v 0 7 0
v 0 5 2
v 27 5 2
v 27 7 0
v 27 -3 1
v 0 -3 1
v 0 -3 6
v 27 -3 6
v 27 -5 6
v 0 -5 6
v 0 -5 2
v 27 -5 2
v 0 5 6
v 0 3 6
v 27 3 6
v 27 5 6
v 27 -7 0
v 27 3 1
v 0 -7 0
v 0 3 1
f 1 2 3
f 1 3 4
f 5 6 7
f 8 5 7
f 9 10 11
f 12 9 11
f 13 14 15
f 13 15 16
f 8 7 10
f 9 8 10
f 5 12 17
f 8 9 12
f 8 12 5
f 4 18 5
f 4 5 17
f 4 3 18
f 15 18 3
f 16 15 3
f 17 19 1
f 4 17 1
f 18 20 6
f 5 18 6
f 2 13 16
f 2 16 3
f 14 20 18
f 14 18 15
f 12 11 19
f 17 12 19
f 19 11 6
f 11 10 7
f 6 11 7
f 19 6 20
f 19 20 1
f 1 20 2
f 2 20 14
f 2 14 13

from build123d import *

# Parameters (mm, degrees)
PAD_DEPTH = 27


with BuildPart() as part:
    # Sketch → Pad (new body)
    with BuildSketch(Plane.YZ):
        Polygon((0, 0), (0, 1), (3, 1), (3, 6), (5, 6), (5, 2), (7, 0), align=None)
    pad = extrude(amount=PAD_DEPTH)

    # Mirrored: Pad across Sketch V_Axis
    add(pad.mirror(Plane(origin=(0, 0, 0), x_dir=(1, 0, 0), z_dir=(0, 1, 0))))


solid = part.part
